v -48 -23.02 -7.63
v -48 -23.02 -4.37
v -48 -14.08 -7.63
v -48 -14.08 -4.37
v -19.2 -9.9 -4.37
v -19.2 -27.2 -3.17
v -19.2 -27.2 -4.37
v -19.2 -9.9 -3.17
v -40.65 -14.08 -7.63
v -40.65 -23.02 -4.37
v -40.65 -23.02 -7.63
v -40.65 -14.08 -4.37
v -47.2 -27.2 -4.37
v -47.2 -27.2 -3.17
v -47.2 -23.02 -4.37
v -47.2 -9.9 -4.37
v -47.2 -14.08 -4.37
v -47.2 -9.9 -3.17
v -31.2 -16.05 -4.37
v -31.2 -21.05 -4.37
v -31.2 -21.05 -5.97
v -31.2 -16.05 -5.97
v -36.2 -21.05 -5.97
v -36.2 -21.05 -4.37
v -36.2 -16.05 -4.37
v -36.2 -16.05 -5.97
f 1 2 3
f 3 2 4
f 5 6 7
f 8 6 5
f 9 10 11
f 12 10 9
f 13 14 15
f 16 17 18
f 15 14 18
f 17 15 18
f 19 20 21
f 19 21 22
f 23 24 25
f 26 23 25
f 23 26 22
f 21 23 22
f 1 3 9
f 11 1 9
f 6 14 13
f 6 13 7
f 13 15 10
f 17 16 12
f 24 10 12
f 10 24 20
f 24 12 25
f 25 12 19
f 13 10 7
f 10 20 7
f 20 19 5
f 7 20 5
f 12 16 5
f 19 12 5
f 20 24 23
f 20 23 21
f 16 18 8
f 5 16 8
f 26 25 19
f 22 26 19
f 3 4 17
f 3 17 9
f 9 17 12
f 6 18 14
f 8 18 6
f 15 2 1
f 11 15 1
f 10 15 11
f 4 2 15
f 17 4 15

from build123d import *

# Parameters (mm, degrees)
PCB_SK1_W   = 28
PCB_SK1_H   = 17.3
PCB_DEPTH   = 1.2
USB_C_SK2_W = 7.35
USB_C_SK2_H = 8.94
USB_C_DEPTH = 3.26
CHIP_SK3_W  = 5
CHIP_SK3_H  = 5
CHIP_DEPTH  = 1.6


with BuildPart() as part:
    # PCB_Sk1 → PCB (new body)
    with BuildSketch(Plane.XY.offset(-3.17)):
        with Locations((-33.2, -18.55)):
            Rectangle(PCB_SK1_W, PCB_SK1_H)
    extrude(amount=-PCB_DEPTH)

    # USB_C_Sk2 → USB_C (add)
    with BuildSketch(Plane.XY.offset(-4.37)):
        with Locations((-44.325, -18.55)):
            Rectangle(USB_C_SK2_W, USB_C_SK2_H)
    extrude(amount=-USB_C_DEPTH)

    # Chip_Sk3 → Chip (add)
    with BuildSketch(Plane.XY.offset(-4.37)):
        with Locations((-33.7, -18.55)):
            Rectangle(CHIP_SK3_W, CHIP_SK3_H)
    extrude(amount=-CHIP_DEPTH)


solid = part.part
